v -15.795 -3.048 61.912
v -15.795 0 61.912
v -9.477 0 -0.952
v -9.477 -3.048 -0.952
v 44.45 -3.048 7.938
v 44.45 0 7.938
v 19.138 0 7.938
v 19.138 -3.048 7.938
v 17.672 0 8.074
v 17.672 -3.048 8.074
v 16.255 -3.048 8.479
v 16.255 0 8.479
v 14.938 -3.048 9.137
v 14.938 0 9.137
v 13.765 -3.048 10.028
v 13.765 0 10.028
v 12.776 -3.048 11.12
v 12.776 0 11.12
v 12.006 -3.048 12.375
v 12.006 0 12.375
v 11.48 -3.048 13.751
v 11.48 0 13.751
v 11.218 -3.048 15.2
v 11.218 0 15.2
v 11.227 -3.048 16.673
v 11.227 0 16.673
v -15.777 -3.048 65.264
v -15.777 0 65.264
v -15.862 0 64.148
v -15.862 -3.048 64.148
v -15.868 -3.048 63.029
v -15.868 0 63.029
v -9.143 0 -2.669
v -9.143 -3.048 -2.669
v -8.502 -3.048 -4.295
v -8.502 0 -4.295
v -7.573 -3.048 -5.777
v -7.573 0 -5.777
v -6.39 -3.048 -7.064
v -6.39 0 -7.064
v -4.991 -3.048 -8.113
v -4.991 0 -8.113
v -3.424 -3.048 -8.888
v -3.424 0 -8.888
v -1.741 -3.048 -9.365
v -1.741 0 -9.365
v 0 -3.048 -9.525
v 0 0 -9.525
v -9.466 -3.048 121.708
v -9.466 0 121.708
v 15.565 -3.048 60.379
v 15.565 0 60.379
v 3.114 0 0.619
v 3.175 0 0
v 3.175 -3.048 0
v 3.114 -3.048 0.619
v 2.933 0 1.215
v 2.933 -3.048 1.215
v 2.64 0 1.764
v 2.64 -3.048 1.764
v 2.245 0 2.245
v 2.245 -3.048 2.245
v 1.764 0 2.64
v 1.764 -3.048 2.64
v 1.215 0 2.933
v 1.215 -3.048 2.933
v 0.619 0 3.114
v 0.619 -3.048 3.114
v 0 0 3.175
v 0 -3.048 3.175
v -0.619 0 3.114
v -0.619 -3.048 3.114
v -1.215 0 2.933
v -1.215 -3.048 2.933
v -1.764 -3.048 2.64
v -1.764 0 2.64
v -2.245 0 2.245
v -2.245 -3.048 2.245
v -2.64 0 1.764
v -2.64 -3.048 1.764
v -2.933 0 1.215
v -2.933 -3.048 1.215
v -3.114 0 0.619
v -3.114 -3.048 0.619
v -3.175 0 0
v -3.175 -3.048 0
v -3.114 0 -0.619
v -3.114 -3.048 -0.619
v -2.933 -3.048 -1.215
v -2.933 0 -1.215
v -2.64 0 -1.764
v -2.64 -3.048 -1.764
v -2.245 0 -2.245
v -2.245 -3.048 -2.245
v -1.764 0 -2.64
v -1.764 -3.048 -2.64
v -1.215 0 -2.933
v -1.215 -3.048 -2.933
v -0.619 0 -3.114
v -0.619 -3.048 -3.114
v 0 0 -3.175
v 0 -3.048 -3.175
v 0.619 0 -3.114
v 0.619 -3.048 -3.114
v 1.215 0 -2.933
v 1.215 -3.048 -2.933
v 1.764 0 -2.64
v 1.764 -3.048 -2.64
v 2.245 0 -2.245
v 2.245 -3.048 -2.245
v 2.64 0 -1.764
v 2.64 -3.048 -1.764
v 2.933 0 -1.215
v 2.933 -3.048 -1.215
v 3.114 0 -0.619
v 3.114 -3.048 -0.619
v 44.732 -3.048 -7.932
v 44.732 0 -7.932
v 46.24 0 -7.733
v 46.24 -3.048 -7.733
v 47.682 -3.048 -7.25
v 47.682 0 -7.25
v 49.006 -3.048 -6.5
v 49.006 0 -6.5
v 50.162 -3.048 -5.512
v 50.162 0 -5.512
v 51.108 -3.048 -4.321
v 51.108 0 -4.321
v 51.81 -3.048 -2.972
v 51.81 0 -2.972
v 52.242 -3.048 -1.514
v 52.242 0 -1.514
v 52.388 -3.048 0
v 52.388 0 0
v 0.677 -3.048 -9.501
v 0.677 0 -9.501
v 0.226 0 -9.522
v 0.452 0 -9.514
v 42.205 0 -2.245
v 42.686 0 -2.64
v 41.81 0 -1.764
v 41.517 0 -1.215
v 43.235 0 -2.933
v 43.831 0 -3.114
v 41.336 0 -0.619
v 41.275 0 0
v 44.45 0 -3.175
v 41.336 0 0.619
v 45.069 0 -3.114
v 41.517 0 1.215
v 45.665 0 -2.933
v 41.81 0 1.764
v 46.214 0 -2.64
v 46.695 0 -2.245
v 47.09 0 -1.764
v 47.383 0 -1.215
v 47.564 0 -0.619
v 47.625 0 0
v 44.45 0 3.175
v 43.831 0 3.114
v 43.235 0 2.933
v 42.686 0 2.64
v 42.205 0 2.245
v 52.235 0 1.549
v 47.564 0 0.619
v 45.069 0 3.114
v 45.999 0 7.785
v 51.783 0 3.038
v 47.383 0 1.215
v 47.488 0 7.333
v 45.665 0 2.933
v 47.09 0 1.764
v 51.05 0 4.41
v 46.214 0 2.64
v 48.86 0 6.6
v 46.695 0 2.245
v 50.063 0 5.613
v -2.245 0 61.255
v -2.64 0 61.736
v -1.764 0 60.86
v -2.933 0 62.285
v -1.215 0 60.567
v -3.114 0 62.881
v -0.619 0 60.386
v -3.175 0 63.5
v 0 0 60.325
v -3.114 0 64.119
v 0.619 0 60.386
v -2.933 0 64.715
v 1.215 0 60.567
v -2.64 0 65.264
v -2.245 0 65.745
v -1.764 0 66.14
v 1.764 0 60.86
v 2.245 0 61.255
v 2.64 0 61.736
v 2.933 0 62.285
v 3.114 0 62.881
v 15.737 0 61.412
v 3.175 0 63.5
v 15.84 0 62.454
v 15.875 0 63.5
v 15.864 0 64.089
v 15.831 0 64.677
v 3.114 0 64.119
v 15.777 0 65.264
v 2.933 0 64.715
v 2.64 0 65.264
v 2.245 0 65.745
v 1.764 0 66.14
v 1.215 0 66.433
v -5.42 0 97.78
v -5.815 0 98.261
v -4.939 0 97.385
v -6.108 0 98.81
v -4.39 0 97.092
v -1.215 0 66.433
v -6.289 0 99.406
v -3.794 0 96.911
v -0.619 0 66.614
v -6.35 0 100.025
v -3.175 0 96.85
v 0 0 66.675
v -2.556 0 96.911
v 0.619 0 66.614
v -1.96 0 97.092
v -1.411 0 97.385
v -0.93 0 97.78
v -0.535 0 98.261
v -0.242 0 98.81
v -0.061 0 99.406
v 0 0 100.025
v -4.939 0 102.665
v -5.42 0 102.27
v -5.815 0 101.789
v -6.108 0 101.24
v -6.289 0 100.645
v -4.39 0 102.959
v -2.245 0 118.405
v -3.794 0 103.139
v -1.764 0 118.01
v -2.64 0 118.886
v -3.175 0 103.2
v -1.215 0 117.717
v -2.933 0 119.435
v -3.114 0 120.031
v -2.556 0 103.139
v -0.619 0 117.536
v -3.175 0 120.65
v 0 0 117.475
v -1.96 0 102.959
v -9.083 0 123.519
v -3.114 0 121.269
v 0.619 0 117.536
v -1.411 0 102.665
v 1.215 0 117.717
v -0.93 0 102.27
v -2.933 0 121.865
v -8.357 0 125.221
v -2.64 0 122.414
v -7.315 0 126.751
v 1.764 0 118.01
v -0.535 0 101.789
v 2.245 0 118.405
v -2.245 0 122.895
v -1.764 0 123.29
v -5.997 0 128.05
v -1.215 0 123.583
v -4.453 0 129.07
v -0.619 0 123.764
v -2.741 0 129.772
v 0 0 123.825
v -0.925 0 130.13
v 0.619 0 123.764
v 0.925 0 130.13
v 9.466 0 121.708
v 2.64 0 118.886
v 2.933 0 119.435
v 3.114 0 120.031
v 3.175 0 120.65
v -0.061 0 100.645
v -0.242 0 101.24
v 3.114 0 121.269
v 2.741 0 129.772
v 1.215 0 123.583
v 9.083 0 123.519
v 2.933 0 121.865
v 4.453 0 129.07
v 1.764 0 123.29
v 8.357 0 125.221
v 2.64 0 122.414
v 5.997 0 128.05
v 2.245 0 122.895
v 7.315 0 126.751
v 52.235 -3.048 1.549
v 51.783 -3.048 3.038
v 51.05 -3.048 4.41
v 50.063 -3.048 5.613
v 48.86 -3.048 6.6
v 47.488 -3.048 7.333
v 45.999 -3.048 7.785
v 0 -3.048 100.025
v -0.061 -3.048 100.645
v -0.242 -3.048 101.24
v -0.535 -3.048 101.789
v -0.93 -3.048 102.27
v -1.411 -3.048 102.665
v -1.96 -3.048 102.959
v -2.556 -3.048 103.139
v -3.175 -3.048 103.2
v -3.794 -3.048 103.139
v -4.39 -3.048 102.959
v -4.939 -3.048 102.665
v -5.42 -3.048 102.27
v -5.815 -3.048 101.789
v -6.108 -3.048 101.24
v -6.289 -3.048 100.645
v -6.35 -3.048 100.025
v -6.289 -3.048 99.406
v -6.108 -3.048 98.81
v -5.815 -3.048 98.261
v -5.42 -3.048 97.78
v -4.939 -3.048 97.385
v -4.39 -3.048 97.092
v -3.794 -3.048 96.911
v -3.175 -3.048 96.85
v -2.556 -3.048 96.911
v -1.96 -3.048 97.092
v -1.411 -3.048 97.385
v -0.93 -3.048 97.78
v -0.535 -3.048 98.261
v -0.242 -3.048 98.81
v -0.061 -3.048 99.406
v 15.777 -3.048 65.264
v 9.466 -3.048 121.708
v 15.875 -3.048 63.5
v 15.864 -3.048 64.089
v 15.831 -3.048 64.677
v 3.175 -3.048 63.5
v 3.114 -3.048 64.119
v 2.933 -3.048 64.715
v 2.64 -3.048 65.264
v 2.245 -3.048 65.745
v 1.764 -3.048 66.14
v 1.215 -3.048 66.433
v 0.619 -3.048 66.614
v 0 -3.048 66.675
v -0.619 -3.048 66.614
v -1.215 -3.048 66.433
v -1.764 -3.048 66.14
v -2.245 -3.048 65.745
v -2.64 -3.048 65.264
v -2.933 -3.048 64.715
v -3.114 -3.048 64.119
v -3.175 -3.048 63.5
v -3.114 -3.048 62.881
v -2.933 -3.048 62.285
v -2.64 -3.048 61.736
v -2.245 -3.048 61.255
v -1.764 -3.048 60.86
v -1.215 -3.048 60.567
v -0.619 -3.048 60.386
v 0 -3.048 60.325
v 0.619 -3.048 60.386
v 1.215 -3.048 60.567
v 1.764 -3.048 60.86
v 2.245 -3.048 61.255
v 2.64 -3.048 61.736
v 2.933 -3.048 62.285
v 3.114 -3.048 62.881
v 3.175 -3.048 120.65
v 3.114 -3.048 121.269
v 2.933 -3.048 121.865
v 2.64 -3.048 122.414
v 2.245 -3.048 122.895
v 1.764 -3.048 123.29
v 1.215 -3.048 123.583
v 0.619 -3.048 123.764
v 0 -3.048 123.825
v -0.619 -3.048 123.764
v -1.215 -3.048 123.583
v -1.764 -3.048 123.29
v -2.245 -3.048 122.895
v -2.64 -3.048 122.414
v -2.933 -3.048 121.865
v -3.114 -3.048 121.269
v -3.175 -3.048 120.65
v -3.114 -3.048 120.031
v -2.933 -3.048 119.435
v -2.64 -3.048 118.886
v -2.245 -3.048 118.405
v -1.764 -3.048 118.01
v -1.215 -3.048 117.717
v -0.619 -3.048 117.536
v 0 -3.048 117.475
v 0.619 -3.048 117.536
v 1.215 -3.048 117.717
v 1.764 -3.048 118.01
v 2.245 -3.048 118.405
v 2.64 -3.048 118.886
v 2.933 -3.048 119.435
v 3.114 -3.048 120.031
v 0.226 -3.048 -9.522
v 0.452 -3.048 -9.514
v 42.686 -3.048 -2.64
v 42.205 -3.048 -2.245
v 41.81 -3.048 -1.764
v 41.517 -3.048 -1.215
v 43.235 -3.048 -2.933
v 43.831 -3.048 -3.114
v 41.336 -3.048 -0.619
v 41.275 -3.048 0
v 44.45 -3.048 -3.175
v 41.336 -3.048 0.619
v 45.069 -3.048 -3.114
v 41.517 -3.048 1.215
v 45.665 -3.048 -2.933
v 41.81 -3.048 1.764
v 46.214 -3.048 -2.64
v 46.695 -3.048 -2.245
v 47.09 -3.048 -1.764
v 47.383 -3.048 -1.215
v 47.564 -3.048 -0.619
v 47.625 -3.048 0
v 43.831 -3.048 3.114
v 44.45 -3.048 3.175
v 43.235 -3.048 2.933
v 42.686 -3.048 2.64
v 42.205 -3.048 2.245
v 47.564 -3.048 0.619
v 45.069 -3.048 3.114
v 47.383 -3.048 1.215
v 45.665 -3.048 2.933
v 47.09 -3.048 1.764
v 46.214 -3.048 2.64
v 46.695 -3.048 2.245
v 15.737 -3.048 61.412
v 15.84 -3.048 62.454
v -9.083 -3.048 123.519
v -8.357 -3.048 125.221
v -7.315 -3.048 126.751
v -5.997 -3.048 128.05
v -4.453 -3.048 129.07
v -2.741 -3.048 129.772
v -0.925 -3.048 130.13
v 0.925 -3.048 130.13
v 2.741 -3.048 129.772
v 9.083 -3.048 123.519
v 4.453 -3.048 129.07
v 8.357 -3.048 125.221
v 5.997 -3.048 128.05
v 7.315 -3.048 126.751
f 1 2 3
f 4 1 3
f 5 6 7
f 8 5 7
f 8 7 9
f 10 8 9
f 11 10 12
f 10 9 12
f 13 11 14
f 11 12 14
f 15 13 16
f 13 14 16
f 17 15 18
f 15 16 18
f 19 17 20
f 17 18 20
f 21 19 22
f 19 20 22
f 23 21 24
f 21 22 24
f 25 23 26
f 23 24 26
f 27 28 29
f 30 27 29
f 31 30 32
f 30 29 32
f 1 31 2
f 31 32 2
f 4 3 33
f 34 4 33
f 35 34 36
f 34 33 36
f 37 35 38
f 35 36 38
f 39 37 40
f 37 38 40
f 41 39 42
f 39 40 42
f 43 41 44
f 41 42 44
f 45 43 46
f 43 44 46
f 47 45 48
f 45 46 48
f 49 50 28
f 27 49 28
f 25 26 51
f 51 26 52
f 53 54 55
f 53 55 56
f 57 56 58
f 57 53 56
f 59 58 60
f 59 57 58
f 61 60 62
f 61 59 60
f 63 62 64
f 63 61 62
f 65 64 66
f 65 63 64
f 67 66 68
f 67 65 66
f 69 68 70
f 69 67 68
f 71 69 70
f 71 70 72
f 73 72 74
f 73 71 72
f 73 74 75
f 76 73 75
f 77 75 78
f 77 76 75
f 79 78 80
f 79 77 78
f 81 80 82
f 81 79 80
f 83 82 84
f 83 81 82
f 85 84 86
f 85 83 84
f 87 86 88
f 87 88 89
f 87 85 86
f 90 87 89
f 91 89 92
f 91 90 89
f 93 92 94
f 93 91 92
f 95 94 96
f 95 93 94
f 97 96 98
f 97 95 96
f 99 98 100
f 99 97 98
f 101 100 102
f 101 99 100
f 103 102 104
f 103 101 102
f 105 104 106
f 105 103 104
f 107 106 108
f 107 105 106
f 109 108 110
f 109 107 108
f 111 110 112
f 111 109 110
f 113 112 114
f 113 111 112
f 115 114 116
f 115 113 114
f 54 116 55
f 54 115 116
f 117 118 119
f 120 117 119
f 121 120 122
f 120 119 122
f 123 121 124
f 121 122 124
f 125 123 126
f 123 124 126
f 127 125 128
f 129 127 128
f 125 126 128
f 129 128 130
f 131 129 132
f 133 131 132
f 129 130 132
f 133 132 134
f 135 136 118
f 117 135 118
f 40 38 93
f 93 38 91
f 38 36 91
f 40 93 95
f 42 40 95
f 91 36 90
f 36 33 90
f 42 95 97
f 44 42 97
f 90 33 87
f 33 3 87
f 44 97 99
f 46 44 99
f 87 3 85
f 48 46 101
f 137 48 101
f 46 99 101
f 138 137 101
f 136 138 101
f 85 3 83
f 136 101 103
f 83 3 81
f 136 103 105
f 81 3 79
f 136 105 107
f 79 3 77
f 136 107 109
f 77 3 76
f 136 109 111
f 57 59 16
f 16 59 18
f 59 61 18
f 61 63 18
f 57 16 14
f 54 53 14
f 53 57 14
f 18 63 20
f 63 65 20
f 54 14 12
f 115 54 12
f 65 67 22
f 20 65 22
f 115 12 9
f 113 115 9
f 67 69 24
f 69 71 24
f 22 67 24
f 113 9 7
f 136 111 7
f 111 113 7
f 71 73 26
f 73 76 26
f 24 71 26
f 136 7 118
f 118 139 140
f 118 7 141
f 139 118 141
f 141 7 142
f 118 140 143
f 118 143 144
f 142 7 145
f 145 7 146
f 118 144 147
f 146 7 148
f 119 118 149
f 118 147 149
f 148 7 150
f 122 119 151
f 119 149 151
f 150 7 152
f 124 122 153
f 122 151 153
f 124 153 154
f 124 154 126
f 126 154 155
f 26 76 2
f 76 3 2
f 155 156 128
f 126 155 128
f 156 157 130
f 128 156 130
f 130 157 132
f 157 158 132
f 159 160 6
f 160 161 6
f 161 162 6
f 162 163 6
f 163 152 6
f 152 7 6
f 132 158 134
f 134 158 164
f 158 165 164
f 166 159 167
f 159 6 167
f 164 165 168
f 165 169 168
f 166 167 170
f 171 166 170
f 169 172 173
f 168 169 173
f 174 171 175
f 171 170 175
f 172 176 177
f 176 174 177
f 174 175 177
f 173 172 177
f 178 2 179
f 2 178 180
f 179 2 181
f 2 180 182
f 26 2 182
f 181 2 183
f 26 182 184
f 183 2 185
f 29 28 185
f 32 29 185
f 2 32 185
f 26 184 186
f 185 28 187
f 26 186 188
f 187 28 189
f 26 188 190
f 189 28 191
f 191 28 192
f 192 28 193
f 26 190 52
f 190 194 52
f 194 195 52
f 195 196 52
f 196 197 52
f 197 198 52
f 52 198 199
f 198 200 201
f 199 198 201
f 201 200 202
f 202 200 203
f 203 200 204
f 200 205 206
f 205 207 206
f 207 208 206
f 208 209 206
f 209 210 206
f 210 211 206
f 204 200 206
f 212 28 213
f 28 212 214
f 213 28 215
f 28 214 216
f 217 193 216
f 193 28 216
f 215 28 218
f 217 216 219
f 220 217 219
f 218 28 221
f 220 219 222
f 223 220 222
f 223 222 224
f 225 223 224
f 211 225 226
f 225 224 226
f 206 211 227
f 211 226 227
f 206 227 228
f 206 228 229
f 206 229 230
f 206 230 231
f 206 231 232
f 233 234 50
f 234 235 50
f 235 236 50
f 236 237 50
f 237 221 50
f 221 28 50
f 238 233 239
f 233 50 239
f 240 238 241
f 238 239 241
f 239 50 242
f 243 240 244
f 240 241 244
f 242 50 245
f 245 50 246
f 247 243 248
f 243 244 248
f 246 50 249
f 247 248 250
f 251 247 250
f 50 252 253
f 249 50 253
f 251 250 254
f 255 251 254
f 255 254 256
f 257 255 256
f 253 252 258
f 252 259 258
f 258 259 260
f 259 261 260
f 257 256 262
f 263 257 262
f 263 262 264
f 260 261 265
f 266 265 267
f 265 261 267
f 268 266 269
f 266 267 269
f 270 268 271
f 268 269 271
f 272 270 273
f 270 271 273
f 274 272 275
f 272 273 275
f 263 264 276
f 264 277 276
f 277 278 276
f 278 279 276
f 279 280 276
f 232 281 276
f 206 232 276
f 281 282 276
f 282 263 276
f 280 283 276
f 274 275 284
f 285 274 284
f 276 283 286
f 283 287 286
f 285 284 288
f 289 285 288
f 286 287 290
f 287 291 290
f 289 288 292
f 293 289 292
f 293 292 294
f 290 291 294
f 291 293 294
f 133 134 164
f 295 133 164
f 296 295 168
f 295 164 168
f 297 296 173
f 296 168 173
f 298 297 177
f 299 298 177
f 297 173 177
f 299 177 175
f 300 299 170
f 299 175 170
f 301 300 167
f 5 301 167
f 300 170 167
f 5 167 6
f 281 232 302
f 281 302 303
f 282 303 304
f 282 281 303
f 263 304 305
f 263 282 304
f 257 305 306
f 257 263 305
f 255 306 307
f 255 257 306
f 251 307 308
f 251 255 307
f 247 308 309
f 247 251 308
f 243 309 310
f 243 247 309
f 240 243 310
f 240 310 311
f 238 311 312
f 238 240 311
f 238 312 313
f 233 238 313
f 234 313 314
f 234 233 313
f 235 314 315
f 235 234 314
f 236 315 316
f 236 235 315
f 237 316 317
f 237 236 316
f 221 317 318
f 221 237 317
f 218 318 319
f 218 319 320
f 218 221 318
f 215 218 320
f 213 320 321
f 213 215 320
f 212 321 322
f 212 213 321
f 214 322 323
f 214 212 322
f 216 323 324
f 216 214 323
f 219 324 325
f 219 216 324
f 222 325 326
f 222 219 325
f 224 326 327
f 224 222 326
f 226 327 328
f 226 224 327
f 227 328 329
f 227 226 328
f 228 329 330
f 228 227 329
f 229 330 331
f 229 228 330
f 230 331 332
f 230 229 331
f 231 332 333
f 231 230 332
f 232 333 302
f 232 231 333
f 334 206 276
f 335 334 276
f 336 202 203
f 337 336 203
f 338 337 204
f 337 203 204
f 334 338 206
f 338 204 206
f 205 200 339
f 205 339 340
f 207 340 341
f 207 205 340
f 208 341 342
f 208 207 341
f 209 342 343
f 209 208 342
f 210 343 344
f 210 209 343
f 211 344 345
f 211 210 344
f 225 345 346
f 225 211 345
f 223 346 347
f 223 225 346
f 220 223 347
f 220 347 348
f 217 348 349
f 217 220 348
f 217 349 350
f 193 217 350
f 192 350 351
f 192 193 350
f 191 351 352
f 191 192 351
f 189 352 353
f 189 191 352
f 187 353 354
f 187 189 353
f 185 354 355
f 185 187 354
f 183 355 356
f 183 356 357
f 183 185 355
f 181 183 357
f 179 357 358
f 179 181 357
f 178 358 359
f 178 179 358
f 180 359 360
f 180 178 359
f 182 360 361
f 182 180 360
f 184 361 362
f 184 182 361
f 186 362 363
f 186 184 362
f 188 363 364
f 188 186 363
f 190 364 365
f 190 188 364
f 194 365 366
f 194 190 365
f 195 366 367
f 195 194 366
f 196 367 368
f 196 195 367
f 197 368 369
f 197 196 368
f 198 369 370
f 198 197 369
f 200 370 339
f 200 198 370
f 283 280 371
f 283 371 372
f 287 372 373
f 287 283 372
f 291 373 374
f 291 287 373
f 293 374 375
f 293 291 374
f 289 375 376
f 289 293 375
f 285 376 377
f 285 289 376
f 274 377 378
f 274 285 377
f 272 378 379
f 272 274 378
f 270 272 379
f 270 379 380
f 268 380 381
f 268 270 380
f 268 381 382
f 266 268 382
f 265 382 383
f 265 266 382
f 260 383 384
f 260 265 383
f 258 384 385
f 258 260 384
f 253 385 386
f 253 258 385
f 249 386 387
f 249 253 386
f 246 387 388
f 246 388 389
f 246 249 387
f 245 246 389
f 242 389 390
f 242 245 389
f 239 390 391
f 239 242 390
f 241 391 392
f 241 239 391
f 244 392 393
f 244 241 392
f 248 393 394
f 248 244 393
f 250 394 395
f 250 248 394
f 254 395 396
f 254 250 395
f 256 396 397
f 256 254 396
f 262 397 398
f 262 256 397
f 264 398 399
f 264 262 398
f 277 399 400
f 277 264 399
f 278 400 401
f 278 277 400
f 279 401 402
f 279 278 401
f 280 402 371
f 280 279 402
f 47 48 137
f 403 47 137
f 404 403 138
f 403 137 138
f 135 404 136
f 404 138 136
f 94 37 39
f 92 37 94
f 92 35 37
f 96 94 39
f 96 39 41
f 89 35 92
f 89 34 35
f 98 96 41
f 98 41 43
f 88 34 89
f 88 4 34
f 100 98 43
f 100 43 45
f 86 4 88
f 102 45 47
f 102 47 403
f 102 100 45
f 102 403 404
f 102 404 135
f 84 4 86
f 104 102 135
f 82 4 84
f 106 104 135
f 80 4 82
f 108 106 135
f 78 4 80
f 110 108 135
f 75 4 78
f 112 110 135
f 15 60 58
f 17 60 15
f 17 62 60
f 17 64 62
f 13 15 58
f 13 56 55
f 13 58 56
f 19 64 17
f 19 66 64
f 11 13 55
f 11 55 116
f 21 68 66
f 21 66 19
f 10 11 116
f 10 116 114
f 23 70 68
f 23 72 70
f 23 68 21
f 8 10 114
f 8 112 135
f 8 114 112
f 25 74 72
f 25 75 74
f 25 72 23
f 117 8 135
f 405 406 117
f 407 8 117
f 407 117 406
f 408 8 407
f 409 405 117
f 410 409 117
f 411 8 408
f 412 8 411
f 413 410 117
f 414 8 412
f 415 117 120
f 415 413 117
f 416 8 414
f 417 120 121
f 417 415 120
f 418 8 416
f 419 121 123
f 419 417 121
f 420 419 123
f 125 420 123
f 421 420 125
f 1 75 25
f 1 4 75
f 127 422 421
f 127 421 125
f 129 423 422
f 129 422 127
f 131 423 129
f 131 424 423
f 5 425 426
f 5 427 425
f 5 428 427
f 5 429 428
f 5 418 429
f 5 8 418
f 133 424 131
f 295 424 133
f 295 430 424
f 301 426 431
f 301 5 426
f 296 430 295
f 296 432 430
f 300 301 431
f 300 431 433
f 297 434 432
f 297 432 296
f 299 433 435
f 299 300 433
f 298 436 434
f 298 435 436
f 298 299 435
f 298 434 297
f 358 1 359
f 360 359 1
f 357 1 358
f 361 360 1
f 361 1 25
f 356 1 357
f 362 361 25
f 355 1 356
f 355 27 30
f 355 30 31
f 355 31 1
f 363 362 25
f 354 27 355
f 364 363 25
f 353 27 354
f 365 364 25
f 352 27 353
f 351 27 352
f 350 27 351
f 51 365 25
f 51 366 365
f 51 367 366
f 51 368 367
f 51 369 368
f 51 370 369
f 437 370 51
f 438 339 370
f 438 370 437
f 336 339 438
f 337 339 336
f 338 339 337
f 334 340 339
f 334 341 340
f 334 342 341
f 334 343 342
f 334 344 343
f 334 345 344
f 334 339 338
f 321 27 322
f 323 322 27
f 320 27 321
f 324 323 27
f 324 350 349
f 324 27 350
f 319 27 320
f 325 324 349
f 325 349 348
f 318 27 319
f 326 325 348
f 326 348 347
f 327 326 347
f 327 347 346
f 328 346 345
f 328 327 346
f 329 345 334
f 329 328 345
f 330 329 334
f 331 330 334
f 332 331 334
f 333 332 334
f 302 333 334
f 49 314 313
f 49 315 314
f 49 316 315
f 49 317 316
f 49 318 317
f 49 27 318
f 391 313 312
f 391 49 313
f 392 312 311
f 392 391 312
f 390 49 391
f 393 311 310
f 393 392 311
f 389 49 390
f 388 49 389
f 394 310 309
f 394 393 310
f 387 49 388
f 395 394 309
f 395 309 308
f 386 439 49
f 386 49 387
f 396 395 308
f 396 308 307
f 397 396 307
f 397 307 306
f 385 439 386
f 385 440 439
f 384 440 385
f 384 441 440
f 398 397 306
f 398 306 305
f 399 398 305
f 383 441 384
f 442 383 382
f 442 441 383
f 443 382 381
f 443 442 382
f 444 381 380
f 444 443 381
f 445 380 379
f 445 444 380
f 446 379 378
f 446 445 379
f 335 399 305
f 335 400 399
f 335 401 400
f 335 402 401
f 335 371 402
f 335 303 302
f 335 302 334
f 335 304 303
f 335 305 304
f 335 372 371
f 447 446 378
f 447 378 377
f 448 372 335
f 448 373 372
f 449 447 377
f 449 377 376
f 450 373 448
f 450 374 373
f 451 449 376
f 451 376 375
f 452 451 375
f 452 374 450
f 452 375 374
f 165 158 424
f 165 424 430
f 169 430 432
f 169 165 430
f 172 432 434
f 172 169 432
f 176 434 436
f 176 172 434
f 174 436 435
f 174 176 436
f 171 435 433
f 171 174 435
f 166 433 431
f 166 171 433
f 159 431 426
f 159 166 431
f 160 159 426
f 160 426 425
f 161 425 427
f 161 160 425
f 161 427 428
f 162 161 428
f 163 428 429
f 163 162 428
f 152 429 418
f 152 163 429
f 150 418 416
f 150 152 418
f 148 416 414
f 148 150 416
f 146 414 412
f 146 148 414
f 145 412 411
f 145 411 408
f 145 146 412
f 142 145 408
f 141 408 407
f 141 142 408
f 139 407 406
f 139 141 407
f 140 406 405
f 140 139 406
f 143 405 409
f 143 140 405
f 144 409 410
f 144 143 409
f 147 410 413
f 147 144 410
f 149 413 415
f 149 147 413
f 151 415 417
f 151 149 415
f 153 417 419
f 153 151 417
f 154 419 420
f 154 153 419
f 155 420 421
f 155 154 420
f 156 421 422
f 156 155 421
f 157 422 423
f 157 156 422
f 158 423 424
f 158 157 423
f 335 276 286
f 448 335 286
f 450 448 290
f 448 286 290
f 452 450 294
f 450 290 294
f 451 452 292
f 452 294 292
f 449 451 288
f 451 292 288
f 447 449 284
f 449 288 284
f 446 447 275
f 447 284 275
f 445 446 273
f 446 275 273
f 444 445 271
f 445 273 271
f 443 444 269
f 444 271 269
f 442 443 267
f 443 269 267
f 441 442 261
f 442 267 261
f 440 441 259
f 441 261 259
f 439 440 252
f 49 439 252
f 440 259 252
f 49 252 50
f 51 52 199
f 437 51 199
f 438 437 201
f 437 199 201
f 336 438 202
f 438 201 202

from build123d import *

# Parameters (mm, degrees)
F0_R     = 3.175
F1_DEPTH = 3.048


with BuildPart() as f1:
    # F0 (on Front) → F1 (new body)
    with BuildSketch(Plane.XZ):
        with BuildLine():
            ThreePointArc((0.677344, -9.500886), (6.970557, -6.491299), (9.525, 0))
            ThreePointArc((9.525, 0), (-0.476848, 9.513056), (-9.477255, -0.9525))
            ThreePointArc((-9.477255, -0.9525), (-6.389564, -7.063929), (0, -9.525))
            Line((0, -9.525), (0.677344, -9.500886))
        make_face()
        Circle(F0_R, mode=Mode.SUBTRACT)
        with BuildLine():
            ThreePointArc((-9.477255, -0.9525), (-0.476848, 9.513056), (9.525, 0))
            ThreePointArc((9.525, 0), (6.970557, -6.491299), (0.677344, -9.500886))
            Line((0.677344, -9.500886), (44.732405, -7.932475))
            ThreePointArc((44.732405, -7.932475), (36.513756, -0.141225), (44.45, 7.9375))
            Line((44.45, 7.9375), (19.13814, 7.9375))
            ThreePointArc((19.13814, 7.9375), (13.245391, 10.550923), (11.22682, 16.673))
            Line((11.22682, 16.673), (15.565216, 60.379155))
            ThreePointArc((15.565216, 60.379155), (-0.775265, 47.643942), (-15.795426, 61.9125))
            Line((-15.795426, 61.9125), (-9.477255, -0.9525))
        make_face()
        with BuildLine():
            ThreePointArc((0, -9.525), (0.338886, -9.51897), (0.677344, -9.500886))
            Line((0.677344, -9.500886), (0, -9.525))
        make_face()
        with BuildLine():
            ThreePointArc((-15.776702, 65.263889), (-15.874752, 63.58869), (-15.795426, 61.9125))
            ThreePointArc((-15.795426, 61.9125), (-0.775265, 47.643942), (15.565216, 60.379155))
            Line((15.565216, 60.379155), (15.875, 63.5))
            ThreePointArc((15.875, 63.5), (15.850406, 64.383313), (15.776702, 65.263889))
            ThreePointArc((15.776702, 65.263889), (0, 79.375), (-15.776702, 65.263889))
        make_face()
        with Locations((0, 63.5)):
            Circle(F0_R, mode=Mode.SUBTRACT)
        with BuildLine():
            ThreePointArc((44.45, 7.9375), (36.513756, -0.141225), (44.732405, -7.932475))
            ThreePointArc((44.732405, -7.932475), (50.161633, -5.51191), (52.3875, 0))
            ThreePointArc((52.3875, 0), (50.06266, 5.61266), (44.45, 7.9375))
        make_face()
        with Locations((44.45, 0)):
            Circle(F0_R, mode=Mode.SUBTRACT)
        with BuildLine():
            Line((-9.466021, 121.708333), (-15.776702, 65.263889))
            ThreePointArc((-15.776702, 65.263889), (0, 79.375), (15.776702, 65.263889))
            Line((15.776702, 65.263889), (9.466021, 121.708333))
            ThreePointArc((9.466021, 121.708333), (9.510244, 121.179988), (9.525, 120.65))
            ThreePointArc((9.525, 120.65), (-0.529988, 111.139756), (-9.466021, 121.708333))
        make_face()
        with Locations((-3.175, 100.0252)):
            Circle(F0_R, mode=Mode.SUBTRACT)
        with BuildLine():
            Line((15.875, 63.5), (15.565216, 60.379155))
            ThreePointArc((15.565216, 60.379155), (15.797364, 61.931909), (15.875, 63.5))
        make_face()
        with BuildLine():
            ThreePointArc((9.466021, 121.708333), (0, 130.175), (-9.466021, 121.708333))
            ThreePointArc((-9.466021, 121.708333), (-0.529988, 111.139756), (9.525, 120.65))
            ThreePointArc((9.525, 120.65), (9.510244, 121.179988), (9.466021, 121.708333))
        make_face()
        with Locations((0, 120.65)):
            Circle(F0_R, mode=Mode.SUBTRACT)
    extrude(amount=F1_DEPTH)


solid = f1.part
